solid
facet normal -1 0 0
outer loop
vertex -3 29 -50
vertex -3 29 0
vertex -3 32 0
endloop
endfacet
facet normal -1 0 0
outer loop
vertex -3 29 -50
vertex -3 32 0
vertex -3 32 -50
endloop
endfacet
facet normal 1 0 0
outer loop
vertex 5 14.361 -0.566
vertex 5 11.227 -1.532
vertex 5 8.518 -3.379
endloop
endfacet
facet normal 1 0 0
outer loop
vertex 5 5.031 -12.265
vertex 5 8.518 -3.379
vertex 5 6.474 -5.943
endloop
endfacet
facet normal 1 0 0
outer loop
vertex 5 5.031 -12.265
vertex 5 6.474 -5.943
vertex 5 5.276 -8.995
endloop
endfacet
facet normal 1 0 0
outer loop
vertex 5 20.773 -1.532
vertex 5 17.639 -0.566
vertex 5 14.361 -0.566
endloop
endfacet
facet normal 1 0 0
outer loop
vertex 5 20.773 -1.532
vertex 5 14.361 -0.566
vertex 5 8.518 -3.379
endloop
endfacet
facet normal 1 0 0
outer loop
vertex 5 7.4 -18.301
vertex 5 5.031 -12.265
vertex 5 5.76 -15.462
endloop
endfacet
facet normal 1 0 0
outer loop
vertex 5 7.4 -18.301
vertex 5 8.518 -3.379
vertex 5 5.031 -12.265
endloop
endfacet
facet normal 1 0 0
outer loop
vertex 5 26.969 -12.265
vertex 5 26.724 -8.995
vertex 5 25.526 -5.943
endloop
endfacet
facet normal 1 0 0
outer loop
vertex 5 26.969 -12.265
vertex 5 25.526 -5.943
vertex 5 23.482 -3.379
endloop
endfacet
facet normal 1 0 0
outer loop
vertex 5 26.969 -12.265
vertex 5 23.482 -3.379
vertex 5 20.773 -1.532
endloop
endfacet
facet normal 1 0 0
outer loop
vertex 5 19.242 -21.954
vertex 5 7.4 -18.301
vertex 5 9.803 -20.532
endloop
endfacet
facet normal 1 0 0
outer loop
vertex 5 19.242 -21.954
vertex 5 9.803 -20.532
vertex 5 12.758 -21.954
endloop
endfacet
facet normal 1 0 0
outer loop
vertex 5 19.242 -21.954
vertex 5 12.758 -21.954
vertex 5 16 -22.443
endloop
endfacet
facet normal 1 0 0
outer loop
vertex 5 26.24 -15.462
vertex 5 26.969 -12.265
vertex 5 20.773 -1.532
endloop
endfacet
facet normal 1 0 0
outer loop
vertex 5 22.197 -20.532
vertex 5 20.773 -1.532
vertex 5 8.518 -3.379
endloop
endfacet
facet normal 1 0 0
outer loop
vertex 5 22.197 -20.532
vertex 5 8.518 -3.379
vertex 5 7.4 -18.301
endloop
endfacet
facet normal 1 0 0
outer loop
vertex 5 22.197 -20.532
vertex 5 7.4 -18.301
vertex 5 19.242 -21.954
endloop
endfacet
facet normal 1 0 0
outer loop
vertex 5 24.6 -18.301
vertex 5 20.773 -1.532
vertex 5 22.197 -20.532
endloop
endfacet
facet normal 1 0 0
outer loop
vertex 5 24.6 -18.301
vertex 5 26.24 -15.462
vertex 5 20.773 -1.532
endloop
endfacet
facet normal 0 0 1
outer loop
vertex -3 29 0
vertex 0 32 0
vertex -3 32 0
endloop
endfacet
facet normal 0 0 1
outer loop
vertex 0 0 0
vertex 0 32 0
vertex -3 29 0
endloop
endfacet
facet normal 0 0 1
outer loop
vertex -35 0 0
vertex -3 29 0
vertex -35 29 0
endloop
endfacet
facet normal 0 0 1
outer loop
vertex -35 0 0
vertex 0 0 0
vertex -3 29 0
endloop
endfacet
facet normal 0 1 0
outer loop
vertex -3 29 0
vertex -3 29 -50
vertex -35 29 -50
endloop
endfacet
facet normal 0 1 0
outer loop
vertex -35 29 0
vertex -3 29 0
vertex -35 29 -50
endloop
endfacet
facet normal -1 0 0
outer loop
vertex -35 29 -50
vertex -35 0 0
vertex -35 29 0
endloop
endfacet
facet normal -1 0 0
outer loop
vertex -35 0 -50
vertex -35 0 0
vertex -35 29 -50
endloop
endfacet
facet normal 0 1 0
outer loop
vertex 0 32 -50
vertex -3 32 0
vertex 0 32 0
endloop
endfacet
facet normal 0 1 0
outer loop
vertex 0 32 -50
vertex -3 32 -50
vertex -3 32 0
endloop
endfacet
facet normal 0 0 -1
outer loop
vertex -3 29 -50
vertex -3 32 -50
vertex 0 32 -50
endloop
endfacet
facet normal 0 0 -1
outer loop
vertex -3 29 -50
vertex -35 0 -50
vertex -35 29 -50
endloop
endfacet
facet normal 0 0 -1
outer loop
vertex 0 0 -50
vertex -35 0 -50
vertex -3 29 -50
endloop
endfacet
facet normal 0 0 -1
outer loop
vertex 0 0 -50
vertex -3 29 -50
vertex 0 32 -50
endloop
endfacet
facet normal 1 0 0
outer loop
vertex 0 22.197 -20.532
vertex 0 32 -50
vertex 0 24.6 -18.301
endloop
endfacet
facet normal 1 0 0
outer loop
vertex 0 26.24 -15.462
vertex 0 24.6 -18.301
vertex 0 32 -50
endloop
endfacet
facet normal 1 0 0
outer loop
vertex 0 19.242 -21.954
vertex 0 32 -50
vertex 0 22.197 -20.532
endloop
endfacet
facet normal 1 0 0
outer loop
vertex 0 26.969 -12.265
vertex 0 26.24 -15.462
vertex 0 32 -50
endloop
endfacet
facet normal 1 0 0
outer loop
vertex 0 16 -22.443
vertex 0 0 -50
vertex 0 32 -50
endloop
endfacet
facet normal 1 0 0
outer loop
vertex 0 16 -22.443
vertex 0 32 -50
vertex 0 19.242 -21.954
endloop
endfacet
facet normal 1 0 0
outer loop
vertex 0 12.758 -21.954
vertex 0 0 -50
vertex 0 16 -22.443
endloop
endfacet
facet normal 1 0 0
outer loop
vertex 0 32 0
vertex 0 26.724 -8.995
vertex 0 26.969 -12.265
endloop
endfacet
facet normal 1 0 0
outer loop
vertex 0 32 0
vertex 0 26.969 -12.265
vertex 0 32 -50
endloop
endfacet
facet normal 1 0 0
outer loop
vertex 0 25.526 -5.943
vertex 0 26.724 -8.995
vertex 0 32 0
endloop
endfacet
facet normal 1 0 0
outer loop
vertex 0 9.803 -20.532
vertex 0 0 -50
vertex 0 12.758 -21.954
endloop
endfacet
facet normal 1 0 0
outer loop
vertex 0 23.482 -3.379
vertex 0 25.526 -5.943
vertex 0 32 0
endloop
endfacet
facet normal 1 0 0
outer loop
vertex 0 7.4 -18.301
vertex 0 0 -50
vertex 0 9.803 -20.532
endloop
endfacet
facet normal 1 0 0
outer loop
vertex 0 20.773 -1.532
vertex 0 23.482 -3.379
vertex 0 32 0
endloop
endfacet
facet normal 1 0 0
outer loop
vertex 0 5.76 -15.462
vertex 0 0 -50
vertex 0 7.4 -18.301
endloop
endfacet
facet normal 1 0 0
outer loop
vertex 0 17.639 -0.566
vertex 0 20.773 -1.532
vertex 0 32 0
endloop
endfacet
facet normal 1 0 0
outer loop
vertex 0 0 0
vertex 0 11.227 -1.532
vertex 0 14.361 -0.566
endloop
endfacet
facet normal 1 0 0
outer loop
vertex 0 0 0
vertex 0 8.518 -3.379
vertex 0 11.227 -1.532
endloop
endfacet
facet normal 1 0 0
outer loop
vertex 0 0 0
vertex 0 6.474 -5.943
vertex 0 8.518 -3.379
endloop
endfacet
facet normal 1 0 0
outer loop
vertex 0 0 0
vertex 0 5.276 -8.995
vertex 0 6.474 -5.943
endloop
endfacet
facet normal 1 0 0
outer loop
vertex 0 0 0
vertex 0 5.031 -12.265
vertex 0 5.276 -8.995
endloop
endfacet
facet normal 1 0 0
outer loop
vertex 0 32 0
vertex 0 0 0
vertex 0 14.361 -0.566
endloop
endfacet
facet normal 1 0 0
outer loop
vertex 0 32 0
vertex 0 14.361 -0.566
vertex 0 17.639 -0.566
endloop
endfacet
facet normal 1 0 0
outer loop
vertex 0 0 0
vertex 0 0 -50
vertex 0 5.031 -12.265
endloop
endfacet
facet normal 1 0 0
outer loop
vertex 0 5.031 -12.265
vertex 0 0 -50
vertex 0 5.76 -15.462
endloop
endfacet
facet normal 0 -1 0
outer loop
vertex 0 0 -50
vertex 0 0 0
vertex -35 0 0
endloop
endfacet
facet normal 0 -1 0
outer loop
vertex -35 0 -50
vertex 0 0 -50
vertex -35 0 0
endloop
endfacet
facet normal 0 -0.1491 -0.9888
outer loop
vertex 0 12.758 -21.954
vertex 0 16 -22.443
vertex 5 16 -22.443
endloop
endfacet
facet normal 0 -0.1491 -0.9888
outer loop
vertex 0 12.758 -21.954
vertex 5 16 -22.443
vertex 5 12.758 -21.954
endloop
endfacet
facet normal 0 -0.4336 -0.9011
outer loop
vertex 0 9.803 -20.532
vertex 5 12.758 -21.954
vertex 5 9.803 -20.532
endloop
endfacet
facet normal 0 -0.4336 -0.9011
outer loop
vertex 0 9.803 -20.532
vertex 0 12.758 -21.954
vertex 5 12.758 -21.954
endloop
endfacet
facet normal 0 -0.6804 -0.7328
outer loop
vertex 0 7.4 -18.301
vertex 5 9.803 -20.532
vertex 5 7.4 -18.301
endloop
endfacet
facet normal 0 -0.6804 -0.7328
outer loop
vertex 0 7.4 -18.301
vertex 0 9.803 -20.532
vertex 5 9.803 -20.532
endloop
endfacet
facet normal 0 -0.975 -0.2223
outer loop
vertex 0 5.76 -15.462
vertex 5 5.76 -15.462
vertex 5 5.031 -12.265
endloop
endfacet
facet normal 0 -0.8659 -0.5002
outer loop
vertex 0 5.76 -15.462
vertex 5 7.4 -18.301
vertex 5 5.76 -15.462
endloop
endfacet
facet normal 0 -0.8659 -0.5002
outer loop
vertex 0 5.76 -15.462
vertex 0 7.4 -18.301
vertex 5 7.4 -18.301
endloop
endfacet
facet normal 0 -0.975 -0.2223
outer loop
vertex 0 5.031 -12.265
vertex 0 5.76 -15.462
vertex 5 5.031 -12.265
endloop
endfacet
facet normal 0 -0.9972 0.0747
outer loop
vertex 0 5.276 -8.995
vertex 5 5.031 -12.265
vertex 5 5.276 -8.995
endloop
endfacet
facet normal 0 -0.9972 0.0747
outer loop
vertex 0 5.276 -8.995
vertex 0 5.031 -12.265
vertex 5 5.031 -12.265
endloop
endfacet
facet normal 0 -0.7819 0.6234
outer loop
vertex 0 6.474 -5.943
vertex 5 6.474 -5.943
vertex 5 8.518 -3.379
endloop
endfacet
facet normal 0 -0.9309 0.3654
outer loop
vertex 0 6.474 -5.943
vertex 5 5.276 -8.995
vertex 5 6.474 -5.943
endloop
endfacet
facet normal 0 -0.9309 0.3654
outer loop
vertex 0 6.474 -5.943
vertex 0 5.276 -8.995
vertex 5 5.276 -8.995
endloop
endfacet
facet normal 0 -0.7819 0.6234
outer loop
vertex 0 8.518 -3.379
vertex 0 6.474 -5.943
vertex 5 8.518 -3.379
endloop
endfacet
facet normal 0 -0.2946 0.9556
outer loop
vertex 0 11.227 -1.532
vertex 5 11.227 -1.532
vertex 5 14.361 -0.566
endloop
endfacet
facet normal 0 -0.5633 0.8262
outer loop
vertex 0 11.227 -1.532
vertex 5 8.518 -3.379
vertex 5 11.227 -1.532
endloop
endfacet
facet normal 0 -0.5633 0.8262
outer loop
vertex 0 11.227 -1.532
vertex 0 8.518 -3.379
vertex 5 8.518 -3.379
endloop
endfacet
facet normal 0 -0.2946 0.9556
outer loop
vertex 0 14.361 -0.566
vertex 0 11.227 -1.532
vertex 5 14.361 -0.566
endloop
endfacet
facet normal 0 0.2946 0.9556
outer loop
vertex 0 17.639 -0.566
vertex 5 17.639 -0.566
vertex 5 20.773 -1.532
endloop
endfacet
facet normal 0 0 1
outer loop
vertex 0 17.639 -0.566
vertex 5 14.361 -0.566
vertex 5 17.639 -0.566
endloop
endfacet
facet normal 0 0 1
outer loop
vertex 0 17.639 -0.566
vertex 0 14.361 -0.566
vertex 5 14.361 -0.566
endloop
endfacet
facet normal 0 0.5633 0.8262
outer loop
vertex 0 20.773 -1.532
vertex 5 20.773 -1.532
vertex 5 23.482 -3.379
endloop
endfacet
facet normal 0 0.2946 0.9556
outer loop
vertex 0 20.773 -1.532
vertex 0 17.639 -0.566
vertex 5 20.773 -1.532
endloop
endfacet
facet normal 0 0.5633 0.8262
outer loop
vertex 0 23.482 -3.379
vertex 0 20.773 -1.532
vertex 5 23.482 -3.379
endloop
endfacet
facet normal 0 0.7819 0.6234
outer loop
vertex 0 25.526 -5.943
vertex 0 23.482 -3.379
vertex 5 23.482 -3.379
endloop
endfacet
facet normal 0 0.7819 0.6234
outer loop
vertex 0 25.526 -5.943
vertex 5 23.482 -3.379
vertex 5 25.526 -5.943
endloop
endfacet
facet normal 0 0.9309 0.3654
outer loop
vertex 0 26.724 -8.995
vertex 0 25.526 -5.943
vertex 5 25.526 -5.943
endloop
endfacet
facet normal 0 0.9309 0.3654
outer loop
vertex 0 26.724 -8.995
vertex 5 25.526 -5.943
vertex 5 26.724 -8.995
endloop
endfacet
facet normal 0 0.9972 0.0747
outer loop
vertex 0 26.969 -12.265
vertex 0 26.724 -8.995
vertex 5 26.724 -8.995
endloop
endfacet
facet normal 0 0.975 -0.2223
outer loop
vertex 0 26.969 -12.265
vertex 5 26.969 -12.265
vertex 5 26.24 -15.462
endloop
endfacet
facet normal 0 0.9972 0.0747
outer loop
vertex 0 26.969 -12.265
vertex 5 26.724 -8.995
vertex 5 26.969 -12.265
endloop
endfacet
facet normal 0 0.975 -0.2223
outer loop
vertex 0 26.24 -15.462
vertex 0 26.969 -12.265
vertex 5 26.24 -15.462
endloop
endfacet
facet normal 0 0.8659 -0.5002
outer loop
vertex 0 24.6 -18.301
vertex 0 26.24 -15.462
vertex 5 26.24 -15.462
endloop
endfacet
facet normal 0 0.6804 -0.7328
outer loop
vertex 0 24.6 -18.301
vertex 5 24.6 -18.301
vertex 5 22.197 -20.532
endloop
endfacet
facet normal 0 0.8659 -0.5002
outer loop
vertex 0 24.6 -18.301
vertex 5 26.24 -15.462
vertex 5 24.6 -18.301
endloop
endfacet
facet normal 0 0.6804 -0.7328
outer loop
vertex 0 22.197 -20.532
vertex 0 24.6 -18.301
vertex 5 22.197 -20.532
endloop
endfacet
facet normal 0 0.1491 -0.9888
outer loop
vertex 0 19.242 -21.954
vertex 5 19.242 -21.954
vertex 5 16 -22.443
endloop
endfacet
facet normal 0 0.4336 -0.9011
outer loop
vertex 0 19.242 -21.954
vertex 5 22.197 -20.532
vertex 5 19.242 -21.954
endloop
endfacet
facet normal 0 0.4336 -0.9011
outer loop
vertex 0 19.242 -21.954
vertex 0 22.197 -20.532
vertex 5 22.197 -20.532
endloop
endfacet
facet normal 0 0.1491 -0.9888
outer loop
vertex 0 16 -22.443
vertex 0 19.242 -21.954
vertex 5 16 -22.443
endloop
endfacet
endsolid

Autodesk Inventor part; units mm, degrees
ref_plane "YZ Plane" through (0, 0, 0) normal (1, 0, 0) x (0, 1, 0)
ref_plane "XZ Plane" through (0, 0, 0) normal (0, 1, 0) x (-1, 0, 0)
ref_plane "XY Plane" through (0, 0, 0) normal (0, 0, 1) x (1, 0, 0)
sketch "Sketch1" plane through (0, 0, 0) normal (0, 1, 0) x (-1, 0, 0)
  line L0 (0, 0) -> (35, 0)
  line L1 (35, 0) -> (35, -50)
  line L2 (35, -50) -> (0, -50)
  line L3 (0, -50) -> (0, 0)
  dimension "d0" = 35
  dimension "d1" = 50
extrude "Extrusion1" add sketch "Sketch1" along normal blind 29
sketch "Sketch2" plane through (0, 29, 0) normal (0, 1, 0) x (1, 0, 0)
  line L0 (0, 50) -> (-35, 50) projected
  line L1 (0, 0) -> (-3, 0)
  line L2 (-3, 0) -> (-3, 50)
  line L3 (-3, 50) -> (0, 50)
  line L4 (0, 50) -> (0, 0)
  dimension "d4" = 3
extrude "Extrusion2" add sketch "Sketch2" along normal blind 3
sketch "Sketch3" plane through (0, 0, 0) normal (1, 0, 0) x (0, 0, -1)
  circle A0 centre (11.443, 16) radius 11
  dimension "d7" = 22
extrude "Extrusion3" add sketch "Sketch3" along normal blind 5
properties part number "motor"
